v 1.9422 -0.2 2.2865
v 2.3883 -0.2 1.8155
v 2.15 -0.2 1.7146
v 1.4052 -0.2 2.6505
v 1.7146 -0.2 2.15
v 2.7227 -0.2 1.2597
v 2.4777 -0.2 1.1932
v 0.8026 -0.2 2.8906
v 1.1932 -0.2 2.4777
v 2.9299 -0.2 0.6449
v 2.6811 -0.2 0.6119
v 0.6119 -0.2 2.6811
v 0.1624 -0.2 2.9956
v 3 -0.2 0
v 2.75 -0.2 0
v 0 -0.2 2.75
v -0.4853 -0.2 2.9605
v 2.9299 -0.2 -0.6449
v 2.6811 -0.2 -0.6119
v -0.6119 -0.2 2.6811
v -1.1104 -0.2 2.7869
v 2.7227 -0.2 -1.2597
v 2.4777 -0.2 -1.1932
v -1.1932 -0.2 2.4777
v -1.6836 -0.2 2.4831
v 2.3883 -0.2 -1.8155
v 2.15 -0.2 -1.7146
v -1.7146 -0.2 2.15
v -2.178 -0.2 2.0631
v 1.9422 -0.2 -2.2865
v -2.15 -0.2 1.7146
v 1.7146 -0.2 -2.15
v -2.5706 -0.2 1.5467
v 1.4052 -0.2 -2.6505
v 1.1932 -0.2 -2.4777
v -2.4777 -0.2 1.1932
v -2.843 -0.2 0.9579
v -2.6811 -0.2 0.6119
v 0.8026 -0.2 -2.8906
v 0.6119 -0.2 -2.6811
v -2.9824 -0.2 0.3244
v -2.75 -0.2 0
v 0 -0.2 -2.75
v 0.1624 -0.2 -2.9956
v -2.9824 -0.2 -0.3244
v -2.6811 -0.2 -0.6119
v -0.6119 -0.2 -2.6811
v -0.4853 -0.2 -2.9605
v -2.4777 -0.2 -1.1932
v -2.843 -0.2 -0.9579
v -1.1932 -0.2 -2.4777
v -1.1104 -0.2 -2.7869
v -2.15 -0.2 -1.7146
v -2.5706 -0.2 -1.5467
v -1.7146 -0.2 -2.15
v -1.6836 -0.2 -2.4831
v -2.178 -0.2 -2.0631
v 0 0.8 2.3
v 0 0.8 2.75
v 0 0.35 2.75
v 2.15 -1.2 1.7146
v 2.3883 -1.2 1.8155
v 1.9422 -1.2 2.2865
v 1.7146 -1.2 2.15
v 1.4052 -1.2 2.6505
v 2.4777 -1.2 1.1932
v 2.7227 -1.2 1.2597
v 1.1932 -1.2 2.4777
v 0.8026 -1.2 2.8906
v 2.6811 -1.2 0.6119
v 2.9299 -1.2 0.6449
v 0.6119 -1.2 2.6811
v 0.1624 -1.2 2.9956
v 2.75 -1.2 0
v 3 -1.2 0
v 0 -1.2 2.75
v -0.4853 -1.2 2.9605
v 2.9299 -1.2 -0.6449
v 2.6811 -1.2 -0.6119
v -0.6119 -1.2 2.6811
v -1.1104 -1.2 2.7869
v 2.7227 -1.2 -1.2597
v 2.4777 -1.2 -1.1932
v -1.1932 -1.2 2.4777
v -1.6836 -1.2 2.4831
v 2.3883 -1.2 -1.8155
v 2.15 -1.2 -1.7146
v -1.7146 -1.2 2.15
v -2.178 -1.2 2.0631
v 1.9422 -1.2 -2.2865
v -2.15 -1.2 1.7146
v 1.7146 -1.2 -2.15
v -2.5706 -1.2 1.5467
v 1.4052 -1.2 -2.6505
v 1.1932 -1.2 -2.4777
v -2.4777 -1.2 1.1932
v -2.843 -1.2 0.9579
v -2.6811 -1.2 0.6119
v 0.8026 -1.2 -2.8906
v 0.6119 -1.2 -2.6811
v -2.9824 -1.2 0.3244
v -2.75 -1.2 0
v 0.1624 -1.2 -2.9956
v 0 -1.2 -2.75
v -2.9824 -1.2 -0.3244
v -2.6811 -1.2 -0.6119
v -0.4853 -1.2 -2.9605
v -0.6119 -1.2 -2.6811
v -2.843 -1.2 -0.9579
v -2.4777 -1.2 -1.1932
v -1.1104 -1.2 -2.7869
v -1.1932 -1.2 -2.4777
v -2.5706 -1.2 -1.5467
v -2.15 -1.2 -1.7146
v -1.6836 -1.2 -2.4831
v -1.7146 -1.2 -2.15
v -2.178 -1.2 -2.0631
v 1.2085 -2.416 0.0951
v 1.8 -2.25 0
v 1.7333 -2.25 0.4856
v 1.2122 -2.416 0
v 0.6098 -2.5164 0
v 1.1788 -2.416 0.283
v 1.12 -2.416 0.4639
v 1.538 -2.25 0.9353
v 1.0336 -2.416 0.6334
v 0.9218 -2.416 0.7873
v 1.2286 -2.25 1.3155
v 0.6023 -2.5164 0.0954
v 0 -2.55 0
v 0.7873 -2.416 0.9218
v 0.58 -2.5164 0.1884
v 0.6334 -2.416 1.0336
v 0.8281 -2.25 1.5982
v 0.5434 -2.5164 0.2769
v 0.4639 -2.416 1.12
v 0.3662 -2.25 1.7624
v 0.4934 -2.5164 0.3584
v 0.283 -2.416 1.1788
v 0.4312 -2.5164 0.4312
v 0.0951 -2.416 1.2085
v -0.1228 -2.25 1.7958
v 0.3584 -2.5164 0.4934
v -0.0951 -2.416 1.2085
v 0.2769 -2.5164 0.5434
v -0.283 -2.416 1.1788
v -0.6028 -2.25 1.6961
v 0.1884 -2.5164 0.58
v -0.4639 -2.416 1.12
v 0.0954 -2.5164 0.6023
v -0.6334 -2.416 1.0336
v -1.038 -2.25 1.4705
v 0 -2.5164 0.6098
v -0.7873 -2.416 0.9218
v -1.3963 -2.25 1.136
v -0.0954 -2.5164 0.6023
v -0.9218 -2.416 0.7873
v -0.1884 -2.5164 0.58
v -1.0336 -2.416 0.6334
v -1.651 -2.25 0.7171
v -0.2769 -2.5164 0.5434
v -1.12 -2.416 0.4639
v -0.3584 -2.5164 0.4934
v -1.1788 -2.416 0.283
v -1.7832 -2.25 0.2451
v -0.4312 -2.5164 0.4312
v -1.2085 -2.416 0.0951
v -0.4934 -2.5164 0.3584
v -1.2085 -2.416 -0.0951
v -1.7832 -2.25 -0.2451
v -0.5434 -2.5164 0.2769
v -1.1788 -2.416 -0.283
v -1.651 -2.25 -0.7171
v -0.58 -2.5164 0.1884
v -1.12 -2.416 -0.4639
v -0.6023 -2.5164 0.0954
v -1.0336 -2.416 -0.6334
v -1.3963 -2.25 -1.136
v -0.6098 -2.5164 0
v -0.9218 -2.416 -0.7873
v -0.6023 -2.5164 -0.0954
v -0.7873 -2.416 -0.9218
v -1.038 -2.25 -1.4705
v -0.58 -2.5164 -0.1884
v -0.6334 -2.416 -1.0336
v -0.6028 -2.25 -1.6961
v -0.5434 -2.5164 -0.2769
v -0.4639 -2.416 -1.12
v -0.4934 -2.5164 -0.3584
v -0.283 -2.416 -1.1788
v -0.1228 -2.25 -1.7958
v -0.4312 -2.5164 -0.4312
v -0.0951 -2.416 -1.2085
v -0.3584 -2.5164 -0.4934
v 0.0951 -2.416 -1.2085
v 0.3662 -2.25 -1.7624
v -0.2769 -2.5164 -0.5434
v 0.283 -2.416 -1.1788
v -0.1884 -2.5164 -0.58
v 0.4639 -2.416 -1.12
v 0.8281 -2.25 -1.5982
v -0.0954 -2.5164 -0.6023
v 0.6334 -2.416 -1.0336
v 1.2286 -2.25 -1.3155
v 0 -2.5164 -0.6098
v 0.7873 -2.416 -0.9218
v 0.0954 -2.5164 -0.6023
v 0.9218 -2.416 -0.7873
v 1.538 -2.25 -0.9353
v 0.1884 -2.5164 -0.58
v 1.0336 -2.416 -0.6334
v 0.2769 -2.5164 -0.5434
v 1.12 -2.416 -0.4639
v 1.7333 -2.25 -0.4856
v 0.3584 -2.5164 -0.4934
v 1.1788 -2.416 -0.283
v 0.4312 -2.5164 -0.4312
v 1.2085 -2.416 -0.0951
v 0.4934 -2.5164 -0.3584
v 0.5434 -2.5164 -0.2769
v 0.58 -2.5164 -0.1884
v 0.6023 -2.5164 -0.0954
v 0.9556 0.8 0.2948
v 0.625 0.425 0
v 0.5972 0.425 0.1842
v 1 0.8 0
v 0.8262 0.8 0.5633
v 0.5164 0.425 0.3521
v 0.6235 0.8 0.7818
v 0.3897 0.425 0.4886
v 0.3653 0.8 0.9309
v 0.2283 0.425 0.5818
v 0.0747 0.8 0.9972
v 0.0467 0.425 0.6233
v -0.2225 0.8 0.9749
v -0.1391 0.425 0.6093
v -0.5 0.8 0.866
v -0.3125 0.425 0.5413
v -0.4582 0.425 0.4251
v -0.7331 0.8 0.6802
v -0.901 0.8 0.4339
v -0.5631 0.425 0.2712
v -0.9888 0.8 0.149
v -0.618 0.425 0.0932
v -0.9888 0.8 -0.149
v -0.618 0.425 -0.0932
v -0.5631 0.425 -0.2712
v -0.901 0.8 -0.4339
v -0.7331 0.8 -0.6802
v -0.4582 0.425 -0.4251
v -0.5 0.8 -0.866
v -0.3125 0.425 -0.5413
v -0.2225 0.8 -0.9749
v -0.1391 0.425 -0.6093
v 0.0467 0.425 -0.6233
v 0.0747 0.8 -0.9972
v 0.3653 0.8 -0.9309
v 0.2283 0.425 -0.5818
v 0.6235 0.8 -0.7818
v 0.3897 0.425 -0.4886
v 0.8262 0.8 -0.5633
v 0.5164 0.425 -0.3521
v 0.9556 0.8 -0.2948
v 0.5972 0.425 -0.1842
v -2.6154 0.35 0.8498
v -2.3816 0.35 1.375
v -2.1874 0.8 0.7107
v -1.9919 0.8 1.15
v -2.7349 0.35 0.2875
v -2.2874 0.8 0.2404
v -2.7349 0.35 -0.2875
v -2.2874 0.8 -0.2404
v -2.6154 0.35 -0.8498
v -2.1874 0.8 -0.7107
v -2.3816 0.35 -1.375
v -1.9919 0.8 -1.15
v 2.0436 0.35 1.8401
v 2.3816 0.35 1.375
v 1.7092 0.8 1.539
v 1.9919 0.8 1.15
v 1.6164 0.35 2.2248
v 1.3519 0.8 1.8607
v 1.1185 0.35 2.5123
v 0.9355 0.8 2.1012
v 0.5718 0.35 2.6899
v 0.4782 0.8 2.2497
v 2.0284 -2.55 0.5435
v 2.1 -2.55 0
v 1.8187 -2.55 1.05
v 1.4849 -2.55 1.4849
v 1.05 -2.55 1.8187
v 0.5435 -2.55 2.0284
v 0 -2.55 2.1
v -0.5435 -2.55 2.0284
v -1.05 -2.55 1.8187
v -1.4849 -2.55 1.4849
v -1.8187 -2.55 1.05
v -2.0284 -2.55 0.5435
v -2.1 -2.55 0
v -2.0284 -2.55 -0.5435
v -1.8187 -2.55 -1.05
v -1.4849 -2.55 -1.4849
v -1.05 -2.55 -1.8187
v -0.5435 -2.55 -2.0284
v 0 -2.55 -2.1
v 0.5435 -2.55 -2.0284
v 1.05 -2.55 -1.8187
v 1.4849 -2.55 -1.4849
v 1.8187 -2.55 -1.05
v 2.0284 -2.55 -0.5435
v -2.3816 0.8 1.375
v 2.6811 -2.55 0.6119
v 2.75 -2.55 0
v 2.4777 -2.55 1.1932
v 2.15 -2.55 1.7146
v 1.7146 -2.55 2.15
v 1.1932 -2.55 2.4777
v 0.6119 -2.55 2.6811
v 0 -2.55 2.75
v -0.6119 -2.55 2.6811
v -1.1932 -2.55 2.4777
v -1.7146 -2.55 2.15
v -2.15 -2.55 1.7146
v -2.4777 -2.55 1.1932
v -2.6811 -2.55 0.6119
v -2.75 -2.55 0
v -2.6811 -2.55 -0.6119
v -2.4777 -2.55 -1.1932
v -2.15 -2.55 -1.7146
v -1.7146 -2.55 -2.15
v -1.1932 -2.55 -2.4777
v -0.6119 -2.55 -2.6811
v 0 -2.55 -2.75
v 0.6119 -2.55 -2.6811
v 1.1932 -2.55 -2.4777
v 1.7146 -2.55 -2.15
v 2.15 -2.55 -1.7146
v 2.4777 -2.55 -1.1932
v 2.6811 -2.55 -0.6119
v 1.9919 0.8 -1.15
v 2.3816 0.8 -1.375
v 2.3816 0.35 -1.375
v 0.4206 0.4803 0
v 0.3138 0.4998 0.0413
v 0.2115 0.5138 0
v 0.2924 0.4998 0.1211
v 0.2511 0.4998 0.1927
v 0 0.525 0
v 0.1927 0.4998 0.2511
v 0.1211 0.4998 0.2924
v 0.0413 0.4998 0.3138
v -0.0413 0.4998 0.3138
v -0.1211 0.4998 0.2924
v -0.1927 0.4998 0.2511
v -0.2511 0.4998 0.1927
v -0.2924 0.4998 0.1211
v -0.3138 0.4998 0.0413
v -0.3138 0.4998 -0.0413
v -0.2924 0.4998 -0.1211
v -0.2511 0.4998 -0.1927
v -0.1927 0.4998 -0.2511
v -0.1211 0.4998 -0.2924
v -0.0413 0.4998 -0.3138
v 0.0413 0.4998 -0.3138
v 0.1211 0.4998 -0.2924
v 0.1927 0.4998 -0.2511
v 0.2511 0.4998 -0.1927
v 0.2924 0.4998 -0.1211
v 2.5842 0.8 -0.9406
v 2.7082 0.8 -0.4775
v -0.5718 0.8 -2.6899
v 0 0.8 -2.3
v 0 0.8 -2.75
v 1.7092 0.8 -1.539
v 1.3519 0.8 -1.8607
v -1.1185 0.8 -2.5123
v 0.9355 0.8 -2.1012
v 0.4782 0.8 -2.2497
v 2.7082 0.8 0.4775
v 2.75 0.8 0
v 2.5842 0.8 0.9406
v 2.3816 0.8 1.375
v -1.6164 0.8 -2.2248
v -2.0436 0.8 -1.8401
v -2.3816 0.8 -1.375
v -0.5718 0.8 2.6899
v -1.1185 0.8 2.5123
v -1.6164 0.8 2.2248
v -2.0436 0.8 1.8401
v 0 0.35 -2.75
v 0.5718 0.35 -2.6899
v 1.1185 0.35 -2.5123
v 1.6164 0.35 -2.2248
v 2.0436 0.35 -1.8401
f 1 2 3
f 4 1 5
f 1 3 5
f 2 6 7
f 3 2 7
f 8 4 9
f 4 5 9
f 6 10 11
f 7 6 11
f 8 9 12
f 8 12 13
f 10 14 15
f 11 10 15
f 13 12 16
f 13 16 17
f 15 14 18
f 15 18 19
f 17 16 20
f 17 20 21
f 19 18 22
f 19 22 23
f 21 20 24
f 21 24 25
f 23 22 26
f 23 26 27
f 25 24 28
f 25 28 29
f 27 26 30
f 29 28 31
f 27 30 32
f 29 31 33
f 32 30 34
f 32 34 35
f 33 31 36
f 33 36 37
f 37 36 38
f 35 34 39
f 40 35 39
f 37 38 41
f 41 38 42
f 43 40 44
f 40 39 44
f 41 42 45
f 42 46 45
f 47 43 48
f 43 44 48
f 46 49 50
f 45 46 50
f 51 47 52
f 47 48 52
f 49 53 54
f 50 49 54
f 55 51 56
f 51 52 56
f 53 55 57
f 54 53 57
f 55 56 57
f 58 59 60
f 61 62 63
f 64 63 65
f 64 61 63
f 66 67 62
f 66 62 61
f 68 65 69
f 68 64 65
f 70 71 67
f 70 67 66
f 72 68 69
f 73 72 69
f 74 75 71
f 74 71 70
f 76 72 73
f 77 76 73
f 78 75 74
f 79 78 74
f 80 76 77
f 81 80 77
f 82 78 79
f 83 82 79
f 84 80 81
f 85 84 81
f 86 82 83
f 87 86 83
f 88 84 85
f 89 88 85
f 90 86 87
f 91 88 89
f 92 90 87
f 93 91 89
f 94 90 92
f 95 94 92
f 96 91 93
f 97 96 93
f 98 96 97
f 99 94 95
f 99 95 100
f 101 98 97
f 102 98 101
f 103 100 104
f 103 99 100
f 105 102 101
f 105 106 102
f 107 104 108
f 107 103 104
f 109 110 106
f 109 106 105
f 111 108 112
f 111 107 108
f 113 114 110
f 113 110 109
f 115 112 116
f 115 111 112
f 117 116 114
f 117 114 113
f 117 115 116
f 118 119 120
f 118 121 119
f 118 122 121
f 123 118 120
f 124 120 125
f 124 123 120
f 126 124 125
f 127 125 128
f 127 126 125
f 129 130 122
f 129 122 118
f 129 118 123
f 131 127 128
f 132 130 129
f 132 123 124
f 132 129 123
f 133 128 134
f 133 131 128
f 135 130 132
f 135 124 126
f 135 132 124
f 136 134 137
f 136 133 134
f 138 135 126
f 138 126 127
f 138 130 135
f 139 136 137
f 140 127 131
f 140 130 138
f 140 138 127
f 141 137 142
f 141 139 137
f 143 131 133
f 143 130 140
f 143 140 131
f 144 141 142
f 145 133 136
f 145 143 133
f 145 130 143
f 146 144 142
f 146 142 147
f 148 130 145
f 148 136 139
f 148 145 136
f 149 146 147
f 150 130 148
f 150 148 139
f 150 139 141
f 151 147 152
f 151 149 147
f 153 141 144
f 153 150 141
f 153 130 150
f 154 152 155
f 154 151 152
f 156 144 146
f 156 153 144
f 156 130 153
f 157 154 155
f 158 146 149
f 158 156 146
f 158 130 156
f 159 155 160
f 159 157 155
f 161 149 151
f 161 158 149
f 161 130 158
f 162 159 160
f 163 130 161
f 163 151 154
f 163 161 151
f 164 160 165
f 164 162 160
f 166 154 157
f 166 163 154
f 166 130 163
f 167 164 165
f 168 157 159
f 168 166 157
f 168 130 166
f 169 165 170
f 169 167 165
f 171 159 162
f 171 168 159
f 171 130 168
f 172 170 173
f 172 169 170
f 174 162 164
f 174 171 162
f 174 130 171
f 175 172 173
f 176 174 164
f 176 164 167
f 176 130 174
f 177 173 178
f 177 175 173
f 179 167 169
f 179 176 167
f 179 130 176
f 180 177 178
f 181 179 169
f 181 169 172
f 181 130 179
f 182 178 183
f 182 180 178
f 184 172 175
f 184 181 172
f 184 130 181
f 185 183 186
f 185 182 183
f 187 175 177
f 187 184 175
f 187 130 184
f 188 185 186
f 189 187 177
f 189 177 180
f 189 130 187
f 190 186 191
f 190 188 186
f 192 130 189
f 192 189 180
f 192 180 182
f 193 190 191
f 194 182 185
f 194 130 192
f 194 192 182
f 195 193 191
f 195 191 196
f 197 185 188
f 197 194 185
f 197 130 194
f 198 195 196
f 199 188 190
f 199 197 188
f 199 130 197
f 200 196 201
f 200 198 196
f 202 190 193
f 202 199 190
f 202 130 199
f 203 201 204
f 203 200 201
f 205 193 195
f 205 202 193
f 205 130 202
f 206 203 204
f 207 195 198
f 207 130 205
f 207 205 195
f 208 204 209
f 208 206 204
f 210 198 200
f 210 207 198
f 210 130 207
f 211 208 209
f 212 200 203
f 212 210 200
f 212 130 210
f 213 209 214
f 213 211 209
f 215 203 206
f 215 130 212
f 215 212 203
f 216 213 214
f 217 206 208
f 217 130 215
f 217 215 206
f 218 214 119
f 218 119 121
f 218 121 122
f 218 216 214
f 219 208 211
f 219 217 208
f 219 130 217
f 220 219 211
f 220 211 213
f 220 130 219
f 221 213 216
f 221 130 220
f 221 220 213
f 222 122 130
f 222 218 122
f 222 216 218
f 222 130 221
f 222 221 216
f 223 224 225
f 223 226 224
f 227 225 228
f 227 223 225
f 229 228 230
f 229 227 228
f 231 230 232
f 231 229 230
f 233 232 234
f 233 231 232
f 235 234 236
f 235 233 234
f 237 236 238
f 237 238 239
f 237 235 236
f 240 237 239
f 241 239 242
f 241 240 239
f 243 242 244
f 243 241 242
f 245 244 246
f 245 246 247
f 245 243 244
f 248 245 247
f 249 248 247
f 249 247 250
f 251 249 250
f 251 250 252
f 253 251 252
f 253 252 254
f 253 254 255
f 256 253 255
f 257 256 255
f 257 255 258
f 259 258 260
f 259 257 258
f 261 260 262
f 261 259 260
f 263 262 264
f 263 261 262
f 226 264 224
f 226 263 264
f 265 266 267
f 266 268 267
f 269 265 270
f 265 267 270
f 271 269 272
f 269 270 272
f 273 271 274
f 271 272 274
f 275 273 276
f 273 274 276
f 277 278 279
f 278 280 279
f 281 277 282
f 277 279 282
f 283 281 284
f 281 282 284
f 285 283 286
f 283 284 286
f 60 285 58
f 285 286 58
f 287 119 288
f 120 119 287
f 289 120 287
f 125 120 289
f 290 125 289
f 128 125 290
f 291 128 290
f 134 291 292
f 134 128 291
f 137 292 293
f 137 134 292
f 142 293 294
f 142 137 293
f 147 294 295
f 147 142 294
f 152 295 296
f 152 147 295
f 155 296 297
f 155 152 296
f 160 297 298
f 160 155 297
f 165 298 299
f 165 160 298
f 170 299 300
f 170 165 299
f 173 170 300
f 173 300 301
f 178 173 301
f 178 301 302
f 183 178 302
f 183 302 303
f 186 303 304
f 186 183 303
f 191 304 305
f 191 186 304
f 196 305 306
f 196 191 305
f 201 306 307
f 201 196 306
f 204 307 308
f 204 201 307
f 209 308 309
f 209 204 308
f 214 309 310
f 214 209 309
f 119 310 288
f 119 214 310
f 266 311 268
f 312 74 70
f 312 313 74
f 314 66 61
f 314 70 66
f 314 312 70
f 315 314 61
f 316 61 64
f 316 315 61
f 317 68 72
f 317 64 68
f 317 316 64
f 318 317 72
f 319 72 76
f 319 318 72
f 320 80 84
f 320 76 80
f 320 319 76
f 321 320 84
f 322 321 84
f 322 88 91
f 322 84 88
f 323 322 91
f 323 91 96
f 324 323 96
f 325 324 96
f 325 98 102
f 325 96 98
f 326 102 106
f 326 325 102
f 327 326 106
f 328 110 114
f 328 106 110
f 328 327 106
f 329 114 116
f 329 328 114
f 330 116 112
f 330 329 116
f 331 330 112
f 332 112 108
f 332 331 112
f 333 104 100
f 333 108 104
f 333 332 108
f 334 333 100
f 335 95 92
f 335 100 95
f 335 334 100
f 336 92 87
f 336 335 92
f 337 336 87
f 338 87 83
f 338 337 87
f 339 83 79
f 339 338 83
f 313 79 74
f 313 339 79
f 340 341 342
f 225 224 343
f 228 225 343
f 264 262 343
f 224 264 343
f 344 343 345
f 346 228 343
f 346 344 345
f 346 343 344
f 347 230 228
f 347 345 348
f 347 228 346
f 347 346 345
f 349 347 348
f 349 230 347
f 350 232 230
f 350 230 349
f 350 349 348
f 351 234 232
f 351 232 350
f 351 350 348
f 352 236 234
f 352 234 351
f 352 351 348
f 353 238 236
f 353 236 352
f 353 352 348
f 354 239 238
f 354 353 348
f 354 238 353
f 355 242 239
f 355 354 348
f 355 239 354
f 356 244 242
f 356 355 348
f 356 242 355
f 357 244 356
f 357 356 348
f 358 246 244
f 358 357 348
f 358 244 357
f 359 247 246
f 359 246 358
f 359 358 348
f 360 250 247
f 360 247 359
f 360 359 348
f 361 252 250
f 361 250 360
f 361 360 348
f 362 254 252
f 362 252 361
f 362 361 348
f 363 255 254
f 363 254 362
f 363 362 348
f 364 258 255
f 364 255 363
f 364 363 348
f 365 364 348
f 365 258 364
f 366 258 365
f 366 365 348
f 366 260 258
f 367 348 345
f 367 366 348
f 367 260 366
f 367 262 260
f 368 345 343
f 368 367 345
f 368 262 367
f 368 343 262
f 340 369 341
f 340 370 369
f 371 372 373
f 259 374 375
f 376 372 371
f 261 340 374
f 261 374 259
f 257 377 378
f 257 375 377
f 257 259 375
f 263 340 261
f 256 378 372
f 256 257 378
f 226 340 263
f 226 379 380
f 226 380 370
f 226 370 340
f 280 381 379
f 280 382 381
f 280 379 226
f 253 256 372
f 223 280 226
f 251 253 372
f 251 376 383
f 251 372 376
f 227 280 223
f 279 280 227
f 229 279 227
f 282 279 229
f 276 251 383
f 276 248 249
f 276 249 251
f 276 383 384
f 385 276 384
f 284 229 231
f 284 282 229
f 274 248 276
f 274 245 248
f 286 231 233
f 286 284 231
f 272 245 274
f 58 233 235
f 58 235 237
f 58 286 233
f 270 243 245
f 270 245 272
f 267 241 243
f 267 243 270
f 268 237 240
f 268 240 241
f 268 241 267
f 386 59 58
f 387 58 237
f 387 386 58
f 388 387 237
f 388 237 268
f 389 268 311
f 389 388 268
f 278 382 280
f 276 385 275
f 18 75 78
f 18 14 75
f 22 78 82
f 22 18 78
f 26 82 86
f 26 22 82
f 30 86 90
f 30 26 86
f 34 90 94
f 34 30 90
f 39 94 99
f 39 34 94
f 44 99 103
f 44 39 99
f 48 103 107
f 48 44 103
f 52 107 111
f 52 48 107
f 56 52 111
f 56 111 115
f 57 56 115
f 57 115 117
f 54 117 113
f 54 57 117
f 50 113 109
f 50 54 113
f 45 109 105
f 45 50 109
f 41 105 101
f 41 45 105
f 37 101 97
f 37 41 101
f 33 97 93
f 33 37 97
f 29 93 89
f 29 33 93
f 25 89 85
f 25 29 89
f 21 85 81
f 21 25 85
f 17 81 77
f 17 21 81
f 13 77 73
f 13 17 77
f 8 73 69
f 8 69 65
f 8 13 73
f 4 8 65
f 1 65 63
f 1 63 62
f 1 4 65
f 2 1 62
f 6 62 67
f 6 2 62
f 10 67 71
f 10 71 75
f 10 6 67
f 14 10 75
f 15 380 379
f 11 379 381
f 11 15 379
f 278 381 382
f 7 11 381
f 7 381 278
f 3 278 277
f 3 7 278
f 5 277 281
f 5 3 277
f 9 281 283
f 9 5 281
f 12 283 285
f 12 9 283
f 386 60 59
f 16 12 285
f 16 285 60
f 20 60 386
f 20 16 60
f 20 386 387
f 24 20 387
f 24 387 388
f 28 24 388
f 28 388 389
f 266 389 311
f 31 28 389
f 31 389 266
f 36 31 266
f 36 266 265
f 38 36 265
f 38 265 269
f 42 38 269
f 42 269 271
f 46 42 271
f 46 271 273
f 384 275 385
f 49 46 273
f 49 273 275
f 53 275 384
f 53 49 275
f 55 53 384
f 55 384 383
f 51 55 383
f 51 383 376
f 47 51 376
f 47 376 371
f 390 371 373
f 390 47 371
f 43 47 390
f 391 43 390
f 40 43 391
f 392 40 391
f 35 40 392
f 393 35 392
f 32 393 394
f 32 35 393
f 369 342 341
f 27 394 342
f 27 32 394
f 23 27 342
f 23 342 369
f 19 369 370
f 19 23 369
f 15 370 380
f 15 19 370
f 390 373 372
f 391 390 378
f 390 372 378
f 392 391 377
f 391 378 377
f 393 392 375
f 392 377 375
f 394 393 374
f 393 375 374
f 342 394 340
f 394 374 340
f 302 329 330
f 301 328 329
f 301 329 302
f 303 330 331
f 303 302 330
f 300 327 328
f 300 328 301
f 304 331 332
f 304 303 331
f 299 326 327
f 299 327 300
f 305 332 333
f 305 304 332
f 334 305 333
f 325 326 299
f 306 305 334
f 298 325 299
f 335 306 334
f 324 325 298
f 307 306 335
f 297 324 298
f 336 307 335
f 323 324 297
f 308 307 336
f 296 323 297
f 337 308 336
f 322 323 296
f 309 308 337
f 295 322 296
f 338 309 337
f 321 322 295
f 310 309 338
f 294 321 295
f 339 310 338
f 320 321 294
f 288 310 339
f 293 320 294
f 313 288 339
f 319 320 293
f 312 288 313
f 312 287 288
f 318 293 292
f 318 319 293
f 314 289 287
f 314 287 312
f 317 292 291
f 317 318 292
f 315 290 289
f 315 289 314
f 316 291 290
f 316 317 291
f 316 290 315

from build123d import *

# Parameters (mm, degrees)
SKIZZE4_W          = 0.25
SKIZZE4_H          = 1
TOOLFACE_ANGLE     = 60
KREISMUSTER1_COUNT = 3


with BuildPart() as part:
    # Skizze3 → Body (revolve)
    with BuildSketch(Plane.XY):
        with BuildLine():
            Line((1, 0.8), (2.75, 0.8))
            Line((2.75, 0.8), (2.75, -2.55))
            Line((2.75, -2.55), (2.1, -2.55))
            Line((2.1, -2.55), (1.8, -2.25))
            ThreePointArc((1.8, -2.25), (0.91241438, -2.474486277), (0, -2.55))
            Line((0, -2.55), (0, 0.525))
            ThreePointArc((0, 0.525), (0.316474723, 0.499842016), (0.625, 0.425))
            Line((0.625, 0.425), (1, 0.8))
        make_face()
    revolve(axis=Axis((0, 0, 0), (0, -1, 0)))

    # Skizze4 → Thread (revolve)
    with BuildSketch(Plane.XY):
        with Locations((2.875, -0.7)):
            Rectangle(SKIZZE4_W, SKIZZE4_H)
    revolve(axis=Axis((0, 0, 0), (0, 1, 0)))

    # Skizze5 → Toolface (revolve, cut)
    with BuildSketch(Plane(origin=(0, 0, 0), x_dir=(0, 0, -1), z_dir=(1, 0, 0))):
        Polygon((2.75, 0.8), (2.75, 0.35), (2.3, 0.8), align=None)
    toolface = revolve(axis=Axis((0, 0, 0), (0, -1, 0)), revolution_arc=TOOLFACE_ANGLE, mode=Mode.SUBTRACT)

    # Kreismuster1: Toolface ×3 about axis
    kreismuster1_axis = Axis((0, 0, 0), (0, 1, 0))
    for i in range(1, KREISMUSTER1_COUNT):
        add(toolface.rotate(kreismuster1_axis, i * 360 / KREISMUSTER1_COUNT), mode=Mode.SUBTRACT)


solid = part.part
